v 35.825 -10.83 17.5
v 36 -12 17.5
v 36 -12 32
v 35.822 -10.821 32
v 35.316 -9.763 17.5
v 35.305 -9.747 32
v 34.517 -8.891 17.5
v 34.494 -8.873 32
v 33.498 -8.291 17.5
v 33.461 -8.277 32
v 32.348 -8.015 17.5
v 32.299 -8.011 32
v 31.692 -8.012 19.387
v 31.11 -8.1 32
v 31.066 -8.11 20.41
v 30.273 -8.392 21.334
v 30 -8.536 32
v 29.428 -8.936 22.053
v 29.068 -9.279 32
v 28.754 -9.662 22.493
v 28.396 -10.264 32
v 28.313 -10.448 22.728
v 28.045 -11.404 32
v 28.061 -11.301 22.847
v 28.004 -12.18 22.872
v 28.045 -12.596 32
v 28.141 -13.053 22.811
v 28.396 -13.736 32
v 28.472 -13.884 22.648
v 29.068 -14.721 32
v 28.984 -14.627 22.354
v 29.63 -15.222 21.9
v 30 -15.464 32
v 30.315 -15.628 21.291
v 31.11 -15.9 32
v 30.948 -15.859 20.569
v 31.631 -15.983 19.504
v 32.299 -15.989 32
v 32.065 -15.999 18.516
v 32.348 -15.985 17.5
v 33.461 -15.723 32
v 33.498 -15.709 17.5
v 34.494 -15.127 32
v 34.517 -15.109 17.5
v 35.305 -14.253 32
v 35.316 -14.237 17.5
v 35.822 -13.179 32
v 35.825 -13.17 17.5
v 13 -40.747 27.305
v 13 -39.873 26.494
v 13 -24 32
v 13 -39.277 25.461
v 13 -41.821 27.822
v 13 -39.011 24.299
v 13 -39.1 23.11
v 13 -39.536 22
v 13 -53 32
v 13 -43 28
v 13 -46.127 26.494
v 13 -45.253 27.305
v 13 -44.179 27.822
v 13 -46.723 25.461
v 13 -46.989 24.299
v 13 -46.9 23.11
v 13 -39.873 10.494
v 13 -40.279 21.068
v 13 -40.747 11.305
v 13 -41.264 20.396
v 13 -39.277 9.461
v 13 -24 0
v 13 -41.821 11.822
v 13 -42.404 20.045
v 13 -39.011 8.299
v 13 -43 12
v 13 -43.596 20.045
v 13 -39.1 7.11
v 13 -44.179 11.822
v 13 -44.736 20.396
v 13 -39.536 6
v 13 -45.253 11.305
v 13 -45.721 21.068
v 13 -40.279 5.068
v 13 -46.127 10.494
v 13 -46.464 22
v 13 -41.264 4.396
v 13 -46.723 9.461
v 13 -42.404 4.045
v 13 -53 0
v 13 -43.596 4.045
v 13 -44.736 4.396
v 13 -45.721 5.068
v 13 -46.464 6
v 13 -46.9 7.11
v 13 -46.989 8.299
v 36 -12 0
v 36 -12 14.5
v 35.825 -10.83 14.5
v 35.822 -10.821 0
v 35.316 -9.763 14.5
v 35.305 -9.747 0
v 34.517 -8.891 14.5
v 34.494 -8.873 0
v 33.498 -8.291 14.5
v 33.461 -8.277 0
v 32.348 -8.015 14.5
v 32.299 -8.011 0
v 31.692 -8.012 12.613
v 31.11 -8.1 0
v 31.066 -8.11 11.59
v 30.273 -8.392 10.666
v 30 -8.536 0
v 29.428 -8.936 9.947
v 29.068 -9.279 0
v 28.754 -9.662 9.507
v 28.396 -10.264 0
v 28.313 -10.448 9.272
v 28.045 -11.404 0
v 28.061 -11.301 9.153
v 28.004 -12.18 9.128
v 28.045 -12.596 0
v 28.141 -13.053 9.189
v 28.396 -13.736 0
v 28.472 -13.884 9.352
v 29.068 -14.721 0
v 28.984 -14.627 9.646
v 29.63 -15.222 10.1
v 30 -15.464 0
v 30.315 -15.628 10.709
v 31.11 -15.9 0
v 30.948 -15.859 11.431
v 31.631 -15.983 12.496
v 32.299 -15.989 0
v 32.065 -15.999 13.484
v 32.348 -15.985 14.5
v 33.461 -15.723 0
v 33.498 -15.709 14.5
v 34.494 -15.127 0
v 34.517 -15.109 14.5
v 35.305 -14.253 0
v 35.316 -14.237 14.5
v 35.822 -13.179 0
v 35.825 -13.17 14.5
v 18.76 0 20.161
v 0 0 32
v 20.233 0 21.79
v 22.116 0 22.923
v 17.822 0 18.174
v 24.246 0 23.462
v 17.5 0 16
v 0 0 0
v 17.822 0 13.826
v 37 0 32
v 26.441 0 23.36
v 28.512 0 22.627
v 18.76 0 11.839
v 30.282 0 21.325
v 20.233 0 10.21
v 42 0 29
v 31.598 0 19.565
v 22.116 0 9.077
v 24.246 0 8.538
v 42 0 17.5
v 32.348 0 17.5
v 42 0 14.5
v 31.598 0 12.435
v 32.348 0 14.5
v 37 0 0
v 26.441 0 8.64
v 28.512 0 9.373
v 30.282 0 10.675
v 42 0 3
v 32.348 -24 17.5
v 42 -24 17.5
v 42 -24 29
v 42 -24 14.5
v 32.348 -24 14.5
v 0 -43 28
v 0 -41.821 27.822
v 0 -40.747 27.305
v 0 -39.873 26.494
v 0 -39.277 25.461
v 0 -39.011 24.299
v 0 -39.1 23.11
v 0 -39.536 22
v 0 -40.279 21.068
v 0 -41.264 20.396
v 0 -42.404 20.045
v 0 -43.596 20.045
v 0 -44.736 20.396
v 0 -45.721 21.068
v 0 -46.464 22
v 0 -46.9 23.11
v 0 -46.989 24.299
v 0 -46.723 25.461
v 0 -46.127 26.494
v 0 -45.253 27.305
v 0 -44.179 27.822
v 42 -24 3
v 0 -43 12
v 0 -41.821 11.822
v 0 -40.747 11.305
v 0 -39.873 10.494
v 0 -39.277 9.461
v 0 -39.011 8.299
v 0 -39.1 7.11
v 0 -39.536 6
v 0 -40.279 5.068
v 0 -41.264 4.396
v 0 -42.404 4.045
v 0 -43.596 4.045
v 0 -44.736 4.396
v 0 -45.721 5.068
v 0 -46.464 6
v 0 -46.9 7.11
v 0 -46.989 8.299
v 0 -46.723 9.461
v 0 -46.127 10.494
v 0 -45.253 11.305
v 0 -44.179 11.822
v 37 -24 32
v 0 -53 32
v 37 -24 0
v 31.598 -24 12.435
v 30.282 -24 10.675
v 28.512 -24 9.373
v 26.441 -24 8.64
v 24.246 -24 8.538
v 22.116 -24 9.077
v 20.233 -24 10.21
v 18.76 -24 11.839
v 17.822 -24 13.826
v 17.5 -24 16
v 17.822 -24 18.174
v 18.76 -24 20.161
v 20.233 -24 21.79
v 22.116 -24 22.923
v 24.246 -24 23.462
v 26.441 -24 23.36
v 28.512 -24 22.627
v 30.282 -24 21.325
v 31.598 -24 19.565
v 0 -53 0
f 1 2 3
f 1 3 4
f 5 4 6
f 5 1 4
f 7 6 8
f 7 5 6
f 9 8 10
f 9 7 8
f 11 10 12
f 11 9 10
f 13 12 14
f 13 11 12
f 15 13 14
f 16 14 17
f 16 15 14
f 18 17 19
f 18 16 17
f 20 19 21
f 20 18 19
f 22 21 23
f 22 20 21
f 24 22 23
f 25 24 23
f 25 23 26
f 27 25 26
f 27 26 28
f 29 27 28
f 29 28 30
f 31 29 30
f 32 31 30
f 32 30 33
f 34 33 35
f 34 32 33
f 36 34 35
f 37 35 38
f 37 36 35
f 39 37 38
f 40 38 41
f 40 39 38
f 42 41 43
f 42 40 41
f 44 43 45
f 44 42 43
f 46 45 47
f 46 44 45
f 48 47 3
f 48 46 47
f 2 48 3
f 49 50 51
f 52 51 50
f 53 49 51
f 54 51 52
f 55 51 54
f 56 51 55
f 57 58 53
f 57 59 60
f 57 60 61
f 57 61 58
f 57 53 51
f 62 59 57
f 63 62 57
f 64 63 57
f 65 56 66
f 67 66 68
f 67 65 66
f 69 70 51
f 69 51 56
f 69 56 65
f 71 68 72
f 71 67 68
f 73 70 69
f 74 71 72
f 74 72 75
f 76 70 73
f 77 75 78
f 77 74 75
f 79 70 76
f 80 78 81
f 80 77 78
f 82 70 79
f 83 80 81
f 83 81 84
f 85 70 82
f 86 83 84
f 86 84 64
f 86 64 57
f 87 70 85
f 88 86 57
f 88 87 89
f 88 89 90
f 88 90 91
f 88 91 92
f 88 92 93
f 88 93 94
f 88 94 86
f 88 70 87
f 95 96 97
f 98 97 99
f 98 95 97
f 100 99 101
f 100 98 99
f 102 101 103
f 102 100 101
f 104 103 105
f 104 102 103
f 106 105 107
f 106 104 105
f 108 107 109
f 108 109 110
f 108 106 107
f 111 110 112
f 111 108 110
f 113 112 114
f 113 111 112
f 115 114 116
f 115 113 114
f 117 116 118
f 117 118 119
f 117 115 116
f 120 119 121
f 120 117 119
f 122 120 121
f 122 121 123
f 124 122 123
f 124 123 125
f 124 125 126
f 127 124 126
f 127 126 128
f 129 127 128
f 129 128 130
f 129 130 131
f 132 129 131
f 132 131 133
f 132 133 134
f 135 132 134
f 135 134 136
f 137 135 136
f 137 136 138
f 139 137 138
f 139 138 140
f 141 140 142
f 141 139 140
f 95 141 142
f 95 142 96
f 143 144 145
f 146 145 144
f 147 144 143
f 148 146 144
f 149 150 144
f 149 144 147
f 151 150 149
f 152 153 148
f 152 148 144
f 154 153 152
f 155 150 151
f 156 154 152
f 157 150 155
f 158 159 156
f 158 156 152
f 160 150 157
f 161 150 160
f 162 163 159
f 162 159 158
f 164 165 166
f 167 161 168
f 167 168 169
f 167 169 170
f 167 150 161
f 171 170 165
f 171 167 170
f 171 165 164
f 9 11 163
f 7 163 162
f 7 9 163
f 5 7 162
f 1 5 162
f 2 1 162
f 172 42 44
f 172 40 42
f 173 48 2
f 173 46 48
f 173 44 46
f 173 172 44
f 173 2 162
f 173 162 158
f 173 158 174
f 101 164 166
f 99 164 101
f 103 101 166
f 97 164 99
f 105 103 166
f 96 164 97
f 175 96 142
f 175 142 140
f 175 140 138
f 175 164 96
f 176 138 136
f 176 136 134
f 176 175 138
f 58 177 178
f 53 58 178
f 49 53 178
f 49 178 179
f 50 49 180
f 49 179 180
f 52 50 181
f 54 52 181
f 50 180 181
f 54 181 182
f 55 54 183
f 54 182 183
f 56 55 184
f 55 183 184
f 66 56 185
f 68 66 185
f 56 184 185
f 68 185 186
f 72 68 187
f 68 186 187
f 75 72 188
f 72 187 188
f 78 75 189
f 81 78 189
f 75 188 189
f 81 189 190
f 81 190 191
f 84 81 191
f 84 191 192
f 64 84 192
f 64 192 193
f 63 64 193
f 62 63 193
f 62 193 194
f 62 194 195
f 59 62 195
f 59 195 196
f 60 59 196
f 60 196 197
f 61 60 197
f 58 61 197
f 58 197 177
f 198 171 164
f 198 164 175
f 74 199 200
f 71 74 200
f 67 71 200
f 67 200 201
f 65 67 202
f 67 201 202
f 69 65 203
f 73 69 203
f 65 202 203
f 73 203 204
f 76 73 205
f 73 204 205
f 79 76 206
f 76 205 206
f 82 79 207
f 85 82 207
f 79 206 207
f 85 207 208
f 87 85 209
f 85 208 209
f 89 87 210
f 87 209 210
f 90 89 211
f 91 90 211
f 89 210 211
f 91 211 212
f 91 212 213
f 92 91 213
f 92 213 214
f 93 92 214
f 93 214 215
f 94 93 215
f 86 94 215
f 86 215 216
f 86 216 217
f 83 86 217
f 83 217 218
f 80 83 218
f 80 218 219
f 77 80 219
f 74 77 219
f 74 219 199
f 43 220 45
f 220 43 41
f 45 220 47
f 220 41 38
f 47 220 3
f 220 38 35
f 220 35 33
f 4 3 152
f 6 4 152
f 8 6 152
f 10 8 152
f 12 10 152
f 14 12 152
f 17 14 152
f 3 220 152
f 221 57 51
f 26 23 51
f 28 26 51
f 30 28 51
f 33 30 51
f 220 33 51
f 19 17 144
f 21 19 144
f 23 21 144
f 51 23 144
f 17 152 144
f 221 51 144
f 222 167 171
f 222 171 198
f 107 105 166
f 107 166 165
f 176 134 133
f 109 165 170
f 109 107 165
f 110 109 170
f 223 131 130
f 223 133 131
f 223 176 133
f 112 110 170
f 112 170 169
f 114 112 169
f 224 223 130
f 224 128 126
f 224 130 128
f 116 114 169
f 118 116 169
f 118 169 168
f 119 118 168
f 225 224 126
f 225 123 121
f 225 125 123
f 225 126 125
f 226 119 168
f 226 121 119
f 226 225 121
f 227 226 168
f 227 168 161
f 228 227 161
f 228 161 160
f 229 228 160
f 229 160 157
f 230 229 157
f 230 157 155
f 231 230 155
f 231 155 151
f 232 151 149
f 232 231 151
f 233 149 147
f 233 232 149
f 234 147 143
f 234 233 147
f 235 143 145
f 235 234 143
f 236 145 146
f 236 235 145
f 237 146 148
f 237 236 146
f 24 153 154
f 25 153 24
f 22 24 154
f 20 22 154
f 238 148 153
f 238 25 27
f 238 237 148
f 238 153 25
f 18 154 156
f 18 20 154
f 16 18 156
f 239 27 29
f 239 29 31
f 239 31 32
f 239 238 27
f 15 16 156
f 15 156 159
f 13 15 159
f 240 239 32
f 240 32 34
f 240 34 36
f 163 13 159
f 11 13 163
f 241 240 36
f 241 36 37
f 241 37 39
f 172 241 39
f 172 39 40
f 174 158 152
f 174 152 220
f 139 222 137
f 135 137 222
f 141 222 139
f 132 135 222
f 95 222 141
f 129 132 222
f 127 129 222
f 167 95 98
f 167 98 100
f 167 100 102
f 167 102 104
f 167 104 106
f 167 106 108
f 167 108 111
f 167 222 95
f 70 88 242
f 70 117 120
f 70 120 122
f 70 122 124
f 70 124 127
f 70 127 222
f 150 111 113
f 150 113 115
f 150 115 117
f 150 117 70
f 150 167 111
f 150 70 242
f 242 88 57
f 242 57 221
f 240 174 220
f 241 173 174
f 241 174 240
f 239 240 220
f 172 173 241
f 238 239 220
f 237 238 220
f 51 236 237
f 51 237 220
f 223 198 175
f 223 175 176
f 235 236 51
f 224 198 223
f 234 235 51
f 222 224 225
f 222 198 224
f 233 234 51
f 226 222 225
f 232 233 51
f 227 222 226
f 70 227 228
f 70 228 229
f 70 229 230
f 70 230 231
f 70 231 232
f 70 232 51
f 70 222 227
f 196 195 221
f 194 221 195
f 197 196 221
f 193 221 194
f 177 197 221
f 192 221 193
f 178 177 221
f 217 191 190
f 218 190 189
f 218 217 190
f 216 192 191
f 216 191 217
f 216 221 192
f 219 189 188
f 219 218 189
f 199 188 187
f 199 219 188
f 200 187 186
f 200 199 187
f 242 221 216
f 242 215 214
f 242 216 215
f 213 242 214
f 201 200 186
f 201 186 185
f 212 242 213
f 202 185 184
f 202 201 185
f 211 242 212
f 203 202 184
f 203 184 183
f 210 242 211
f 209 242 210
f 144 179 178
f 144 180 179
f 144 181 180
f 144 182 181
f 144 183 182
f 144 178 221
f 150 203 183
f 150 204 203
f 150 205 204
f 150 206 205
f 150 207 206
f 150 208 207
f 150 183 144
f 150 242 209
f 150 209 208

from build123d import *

# Parameters (mm, degrees)
SKETCH1_R           = 4
BOSS_EXTRUDE1_DEPTH = 32
SKETCH2_R           = 4
CUT_EXTRUDE1_DEPTH  = 75.813100457
CUT_EXTRUDE2_DEPTH  = 61.241181927
CHAMFER1_SIZE       = 5
CHAMFER1_SIZE2      = 3
CHAMFER2_SIZE       = 3
CHAMFER2_SIZE2      = 5


with BuildPart() as part:
    # Sketch1 → Boss-Extrude1 (new body)
    with BuildSketch(Plane.XY):
        Polygon((42, 0), (42, -24), (13, -24), (13, -53), (0, -53), (0, 0), align=None)
        with Locations((32, -12)):
            Circle(SKETCH1_R, mode=Mode.SUBTRACT)
    extrude(amount=BOSS_EXTRUDE1_DEPTH)

    # Sketch2 → Cut-Extrude1 (cut, through all)
    with BuildSketch(Plane.ZY):
        with Locations((8, -43)):
            Circle(SKETCH2_R)
        with Locations((24, -43)):
            Circle(SKETCH2_R)
    extrude(amount=-CUT_EXTRUDE1_DEPTH, mode=Mode.SUBTRACT)

    # Sketch3 → Cut-Extrude2 (cut, through all)
    with BuildSketch(Plane.XZ.offset(24)):
        with BuildLine():
            Line((32.348469228, 17.5), (42, 17.5))
            Line((42, 17.5), (42, 14.5))
            Line((42, 14.5), (32.348469228, 14.5))
            ThreePointArc((32.348469228, 14.5), (17.5, 16), (32.348469228, 17.5))
        make_face()
    extrude(amount=-CUT_EXTRUDE2_DEPTH, mode=Mode.SUBTRACT)

    # Chamfer1
    chamfer1_edges = [part.edges().sort_by_distance(p)[0] for p in [
        (42, -12, 32),
    ]]
    chamfer1_side = [part.faces().sort_by_distance(p)[0] for p in [
        (16.490174092, -19.485009093, 32),
    ]]
    chamfer(chamfer1_edges, length=CHAMFER1_SIZE, length2=CHAMFER1_SIZE2, reference=chamfer1_side[0])

    # Chamfer2
    chamfer2_edges = [part.edges().sort_by_distance(p)[0] for p in [
        (42, -12, 0),
    ]]
    chamfer2_side = [part.faces().sort_by_distance(p)[0] for p in [
        (42, -12, 7.25),
    ]]
    chamfer(chamfer2_edges, length=CHAMFER2_SIZE, length2=CHAMFER2_SIZE2, reference=chamfer2_side[0])


solid = part.part
